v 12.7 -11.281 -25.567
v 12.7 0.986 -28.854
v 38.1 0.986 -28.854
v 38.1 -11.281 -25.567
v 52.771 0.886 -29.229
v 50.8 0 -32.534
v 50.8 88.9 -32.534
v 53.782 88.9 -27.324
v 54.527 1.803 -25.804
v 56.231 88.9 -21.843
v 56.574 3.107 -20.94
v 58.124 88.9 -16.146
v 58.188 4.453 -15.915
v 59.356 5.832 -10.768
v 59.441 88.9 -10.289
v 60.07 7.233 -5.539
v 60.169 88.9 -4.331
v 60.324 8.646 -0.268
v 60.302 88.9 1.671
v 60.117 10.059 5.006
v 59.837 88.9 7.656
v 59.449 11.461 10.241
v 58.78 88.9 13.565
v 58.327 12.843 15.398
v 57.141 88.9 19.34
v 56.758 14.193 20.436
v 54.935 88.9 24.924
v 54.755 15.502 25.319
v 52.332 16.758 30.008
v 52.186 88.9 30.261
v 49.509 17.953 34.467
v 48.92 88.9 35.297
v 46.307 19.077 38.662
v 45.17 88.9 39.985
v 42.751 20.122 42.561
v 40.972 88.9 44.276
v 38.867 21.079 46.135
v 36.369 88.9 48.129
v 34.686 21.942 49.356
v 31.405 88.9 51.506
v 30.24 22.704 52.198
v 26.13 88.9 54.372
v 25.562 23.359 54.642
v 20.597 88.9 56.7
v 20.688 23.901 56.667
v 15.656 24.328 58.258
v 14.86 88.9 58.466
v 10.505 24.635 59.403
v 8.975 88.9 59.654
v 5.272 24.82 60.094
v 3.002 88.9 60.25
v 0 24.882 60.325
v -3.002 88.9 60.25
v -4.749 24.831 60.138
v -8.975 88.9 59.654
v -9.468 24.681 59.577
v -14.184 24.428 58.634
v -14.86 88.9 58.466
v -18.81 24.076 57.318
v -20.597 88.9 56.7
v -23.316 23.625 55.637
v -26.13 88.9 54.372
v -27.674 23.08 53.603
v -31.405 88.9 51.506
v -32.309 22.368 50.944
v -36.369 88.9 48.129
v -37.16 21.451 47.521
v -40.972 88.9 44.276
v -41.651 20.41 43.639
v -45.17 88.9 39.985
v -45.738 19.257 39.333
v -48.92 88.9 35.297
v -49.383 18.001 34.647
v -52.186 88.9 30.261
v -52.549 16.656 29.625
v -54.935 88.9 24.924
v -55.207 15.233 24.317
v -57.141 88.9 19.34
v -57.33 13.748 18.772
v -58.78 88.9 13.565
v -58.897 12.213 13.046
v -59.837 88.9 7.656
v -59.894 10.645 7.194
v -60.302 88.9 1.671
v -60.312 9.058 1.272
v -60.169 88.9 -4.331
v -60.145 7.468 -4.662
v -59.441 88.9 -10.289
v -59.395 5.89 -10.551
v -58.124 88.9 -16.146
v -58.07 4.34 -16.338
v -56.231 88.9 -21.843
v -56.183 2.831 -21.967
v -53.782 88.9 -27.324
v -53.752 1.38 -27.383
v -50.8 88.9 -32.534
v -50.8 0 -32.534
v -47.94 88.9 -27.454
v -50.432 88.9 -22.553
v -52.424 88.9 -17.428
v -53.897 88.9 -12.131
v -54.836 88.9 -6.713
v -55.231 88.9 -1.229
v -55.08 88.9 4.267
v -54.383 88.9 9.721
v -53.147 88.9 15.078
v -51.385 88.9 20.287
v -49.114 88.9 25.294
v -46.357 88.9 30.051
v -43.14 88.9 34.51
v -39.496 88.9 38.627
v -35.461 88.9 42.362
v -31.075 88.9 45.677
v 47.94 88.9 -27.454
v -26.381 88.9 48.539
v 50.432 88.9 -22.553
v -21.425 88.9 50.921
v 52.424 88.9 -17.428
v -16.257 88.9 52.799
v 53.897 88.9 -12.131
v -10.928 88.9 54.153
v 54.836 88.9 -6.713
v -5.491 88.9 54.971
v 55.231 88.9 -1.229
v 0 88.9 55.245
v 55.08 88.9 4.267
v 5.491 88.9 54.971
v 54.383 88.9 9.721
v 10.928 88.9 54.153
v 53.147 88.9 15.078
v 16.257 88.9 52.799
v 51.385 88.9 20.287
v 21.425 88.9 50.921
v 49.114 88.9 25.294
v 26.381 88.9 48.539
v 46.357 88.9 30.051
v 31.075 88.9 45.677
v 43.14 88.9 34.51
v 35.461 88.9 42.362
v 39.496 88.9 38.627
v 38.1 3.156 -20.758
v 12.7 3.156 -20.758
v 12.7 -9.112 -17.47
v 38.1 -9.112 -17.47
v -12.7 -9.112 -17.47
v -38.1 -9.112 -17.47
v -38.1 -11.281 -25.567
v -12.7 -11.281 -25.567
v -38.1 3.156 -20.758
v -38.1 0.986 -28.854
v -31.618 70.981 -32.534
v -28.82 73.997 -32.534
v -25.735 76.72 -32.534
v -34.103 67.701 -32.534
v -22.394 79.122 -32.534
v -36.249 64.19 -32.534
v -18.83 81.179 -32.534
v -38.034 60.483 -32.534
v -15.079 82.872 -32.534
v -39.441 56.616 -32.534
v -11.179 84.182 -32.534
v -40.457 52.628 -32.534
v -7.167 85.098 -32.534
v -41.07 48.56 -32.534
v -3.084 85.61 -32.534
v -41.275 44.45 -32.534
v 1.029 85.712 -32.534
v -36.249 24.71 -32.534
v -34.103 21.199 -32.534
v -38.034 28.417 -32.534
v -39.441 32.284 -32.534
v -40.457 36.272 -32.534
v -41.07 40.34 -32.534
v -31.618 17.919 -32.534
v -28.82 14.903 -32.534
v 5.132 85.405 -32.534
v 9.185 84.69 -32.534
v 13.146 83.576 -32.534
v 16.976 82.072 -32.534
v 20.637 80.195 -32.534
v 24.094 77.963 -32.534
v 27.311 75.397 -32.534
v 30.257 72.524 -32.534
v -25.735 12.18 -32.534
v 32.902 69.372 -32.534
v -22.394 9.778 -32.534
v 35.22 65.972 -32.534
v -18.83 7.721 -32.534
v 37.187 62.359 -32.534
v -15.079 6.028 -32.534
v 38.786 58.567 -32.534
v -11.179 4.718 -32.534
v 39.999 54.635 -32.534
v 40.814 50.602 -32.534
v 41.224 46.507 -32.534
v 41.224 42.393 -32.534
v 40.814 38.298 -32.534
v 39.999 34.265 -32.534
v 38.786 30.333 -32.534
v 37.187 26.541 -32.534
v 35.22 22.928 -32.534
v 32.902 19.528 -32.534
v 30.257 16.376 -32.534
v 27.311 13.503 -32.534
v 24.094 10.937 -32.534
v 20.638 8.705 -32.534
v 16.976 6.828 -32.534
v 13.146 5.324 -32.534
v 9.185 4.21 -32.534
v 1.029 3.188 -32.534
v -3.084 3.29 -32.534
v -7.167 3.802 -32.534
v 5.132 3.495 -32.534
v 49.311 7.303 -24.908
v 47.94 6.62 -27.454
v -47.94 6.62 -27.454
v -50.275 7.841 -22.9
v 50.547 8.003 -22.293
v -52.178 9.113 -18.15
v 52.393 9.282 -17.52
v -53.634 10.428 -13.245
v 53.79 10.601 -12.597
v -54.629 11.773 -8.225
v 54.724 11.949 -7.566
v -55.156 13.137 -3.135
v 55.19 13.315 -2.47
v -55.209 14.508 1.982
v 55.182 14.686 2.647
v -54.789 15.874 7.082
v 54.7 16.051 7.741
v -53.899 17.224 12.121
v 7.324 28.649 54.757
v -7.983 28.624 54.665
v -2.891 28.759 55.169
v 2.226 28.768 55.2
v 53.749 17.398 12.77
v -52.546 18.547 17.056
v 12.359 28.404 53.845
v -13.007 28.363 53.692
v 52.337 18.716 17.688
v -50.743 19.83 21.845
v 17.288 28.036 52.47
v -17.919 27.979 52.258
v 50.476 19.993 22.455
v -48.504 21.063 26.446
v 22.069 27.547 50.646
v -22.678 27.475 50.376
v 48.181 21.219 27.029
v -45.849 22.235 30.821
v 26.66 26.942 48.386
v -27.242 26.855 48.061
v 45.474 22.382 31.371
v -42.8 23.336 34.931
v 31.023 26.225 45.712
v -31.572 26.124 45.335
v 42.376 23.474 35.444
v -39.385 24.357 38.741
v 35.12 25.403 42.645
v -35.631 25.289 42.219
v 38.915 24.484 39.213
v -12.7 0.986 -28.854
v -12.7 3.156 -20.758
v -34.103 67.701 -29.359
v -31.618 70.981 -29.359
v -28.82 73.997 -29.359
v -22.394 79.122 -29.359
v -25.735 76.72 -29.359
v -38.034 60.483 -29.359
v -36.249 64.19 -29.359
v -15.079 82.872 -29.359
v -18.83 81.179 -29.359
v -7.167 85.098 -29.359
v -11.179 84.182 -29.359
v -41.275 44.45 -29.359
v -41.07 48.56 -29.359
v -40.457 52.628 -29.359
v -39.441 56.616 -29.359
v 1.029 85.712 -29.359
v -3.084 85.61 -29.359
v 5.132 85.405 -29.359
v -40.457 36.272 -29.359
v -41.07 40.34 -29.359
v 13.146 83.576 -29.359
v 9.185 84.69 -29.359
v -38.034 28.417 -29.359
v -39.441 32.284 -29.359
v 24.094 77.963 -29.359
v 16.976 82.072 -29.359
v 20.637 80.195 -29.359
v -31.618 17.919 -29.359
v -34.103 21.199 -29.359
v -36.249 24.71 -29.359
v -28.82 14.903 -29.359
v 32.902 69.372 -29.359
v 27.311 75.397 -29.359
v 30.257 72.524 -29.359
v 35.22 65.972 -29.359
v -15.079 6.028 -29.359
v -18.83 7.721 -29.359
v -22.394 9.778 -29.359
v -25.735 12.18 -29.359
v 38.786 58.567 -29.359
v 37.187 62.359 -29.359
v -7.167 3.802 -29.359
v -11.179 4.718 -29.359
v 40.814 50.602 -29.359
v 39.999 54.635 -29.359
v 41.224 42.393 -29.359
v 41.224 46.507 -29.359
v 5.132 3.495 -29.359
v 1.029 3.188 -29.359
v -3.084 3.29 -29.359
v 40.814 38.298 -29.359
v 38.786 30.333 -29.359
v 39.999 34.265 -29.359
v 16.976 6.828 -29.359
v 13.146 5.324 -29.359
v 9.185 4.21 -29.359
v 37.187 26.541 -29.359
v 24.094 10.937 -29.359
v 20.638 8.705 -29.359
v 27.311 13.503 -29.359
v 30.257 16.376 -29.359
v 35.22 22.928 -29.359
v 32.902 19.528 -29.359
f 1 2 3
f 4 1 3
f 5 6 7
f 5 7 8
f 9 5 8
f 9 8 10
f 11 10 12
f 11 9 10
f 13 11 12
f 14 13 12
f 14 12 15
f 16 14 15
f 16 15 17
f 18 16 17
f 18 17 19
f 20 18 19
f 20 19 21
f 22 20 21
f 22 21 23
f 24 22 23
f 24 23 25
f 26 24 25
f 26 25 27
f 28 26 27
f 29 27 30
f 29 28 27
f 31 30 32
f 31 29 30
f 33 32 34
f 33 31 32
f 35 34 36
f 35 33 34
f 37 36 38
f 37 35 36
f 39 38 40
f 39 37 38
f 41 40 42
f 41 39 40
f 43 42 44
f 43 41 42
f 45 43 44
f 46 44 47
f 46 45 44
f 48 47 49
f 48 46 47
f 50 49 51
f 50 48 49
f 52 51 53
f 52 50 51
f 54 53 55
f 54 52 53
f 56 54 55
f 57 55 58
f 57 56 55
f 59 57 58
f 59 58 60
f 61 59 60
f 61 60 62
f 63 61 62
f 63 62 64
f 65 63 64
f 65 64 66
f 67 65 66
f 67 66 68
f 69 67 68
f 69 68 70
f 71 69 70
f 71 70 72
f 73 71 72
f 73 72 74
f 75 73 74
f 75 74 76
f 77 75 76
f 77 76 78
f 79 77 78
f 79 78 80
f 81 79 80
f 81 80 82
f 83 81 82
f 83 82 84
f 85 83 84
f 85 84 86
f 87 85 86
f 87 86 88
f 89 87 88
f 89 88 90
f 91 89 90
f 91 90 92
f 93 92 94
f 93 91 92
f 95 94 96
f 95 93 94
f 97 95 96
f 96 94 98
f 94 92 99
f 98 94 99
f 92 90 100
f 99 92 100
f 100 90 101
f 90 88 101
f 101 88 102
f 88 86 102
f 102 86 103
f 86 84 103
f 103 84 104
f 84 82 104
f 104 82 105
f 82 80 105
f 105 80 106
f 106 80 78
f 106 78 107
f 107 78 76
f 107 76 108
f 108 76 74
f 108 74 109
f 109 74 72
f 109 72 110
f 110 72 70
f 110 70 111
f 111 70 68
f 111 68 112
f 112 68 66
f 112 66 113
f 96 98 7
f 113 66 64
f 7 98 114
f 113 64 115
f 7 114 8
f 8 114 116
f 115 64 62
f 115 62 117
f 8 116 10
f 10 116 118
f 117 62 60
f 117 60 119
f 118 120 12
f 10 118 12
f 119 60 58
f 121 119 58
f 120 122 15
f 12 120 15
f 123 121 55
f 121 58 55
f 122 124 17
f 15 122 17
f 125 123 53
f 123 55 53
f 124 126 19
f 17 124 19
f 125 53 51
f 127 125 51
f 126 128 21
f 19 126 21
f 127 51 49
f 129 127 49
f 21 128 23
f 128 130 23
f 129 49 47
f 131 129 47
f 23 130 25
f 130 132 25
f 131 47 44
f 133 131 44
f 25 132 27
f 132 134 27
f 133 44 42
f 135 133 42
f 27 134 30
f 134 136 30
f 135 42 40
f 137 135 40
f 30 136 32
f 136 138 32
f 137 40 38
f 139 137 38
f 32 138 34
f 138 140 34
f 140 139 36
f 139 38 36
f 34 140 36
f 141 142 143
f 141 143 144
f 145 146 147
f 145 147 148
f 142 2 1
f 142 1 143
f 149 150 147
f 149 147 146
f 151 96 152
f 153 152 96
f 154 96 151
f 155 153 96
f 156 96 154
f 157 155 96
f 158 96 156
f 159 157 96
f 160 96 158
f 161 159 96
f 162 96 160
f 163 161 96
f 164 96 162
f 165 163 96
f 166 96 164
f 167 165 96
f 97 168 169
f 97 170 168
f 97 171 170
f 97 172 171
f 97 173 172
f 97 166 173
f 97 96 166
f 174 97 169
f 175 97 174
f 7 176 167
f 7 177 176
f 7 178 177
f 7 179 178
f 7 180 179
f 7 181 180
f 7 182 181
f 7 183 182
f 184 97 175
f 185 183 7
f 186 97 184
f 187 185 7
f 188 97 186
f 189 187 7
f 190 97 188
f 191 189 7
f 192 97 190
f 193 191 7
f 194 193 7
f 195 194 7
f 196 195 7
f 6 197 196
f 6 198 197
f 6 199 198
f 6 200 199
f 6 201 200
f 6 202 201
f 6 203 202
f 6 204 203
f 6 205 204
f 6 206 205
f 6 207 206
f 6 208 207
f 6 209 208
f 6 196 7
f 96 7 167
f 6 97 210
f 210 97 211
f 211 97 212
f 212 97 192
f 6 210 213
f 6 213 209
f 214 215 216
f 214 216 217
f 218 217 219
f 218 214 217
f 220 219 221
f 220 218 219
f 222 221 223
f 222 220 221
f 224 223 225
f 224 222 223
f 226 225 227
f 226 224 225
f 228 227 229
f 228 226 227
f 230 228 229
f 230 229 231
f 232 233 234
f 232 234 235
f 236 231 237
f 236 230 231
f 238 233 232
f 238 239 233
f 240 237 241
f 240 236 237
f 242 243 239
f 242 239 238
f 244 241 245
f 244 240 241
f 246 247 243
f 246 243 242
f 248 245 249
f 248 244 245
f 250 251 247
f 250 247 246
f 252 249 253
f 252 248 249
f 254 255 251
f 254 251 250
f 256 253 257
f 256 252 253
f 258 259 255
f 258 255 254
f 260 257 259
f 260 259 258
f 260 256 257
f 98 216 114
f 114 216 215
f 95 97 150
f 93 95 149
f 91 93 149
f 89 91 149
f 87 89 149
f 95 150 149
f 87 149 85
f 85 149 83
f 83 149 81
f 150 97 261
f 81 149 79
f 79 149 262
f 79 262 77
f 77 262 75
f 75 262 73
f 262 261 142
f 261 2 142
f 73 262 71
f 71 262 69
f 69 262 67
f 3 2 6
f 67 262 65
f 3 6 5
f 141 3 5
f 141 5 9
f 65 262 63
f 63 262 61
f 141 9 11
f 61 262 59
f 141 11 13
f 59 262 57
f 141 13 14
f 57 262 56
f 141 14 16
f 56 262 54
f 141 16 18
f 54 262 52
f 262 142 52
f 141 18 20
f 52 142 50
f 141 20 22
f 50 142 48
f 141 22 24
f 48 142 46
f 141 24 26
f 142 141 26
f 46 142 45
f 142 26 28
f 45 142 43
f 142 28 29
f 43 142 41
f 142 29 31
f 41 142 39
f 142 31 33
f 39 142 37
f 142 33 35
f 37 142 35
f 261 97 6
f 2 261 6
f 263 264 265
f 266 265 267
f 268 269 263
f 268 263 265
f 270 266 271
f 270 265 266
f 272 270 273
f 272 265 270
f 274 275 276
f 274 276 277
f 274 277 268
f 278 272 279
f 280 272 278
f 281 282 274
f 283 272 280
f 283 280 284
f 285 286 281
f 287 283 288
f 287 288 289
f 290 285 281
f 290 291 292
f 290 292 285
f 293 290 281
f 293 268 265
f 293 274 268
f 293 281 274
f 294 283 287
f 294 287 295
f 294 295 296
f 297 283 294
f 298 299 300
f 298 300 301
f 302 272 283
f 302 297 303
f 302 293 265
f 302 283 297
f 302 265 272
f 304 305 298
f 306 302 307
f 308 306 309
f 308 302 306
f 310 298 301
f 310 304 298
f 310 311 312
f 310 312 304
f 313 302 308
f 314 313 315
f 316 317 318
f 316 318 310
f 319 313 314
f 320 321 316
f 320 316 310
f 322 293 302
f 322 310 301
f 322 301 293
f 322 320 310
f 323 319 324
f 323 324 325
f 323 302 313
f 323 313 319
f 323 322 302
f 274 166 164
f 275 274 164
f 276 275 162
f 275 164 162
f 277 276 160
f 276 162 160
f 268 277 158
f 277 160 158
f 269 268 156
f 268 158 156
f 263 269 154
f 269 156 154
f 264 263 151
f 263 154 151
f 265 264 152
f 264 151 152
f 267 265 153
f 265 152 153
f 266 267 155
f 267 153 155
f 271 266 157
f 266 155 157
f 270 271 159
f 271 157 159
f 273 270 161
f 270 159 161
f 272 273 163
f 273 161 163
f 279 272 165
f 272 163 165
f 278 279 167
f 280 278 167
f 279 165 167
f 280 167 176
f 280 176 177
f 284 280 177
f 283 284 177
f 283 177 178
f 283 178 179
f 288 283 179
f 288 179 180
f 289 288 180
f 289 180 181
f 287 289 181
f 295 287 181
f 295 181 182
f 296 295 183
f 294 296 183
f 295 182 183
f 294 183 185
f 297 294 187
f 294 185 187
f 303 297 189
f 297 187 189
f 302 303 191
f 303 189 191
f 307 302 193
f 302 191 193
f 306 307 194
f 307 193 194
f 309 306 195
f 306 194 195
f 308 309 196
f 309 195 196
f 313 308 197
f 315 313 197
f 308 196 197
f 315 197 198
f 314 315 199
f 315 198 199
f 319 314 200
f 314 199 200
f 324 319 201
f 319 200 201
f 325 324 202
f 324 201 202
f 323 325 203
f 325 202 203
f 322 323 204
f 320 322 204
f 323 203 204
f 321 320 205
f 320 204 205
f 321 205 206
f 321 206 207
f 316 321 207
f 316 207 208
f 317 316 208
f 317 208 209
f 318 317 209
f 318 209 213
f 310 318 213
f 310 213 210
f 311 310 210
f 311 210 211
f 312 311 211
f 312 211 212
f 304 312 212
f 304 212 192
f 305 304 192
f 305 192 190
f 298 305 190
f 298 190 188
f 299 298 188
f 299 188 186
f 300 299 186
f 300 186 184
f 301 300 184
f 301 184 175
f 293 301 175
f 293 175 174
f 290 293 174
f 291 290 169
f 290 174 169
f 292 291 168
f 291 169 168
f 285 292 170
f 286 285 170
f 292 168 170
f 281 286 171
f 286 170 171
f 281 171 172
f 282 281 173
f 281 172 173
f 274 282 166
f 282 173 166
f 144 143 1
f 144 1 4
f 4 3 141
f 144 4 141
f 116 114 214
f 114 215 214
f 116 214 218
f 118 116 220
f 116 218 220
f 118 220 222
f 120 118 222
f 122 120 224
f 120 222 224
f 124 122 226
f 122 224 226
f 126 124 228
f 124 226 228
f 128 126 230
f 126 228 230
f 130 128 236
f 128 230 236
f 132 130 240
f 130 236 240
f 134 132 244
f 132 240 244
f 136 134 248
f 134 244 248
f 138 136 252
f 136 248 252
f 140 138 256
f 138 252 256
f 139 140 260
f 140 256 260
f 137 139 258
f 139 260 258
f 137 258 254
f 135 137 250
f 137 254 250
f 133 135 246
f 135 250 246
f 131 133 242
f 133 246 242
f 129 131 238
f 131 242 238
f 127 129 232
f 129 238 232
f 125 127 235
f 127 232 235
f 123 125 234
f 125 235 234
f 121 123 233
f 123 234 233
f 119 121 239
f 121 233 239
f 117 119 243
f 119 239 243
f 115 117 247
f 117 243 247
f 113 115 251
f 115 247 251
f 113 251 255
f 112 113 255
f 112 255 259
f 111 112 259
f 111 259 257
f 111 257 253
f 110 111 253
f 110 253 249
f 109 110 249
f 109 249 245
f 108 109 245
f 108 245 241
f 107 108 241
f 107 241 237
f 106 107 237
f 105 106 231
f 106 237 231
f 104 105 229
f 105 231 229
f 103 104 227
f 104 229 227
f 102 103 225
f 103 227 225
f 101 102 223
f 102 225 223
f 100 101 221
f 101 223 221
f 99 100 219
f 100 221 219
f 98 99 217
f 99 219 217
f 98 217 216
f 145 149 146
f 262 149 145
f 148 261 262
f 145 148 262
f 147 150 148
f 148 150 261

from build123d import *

# Parameters (mm, degrees)
F1_DEPTH = 88.9
F4_DEPTH = 212.726
F5_T     = -5.08
F6_W     = 25.4
F6_H     = 8.382
F7_DEPTH = 12.7
F9_DEPTH = 3.175


with BuildPart() as f1:
    # F0 (on Front) → F1 (new body)
    with BuildSketch(Plane.XZ):
        with BuildLine():
            Line((-50.8, -32.5340686819), (50.8, -32.5340686819))
            ThreePointArc((50.8, -32.5340686819), (0, 60.325), (-50.8, -32.5340686819))
        make_face()
    extrude(amount=-F1_DEPTH)

    # F3 (on offset) → F4 (cut, through all)
    with BuildSketch(Plane.YZ.offset(152.4)):
        Polygon((24.8815124632, 60.325), (0, 60.325), (0, -32.5340686819), align=None)
    extrude(amount=-F4_DEPTH, mode=Mode.SUBTRACT)

    # F5
    f5_openings = [f1.faces().sort_by_distance(p)[0] for p in [
        (0, 88.9, 9.256329),
    ]]
    offset(amount=F5_T, openings=f5_openings)

    # F6 (on face) → F7 (join)
    with BuildSketch(Plane(origin=(0, 8.1335171705, -2.1793693575), x_dir=(1, 0, 0), z_dir=(0, -0.9659258263, 0.2588190451))):
        with Locations((-25.4, -23.4244971741)):
            Rectangle(F6_W, F6_H)
        with Locations((25.4, -23.4244971741)):
            Rectangle(F6_W, F6_H)
    extrude(amount=F7_DEPTH)

    # F8 (on face) → F9 (cut)
    with BuildSketch(Plane(origin=(0, 0, -32.5340686819), x_dir=(1, 0, 0), z_dir=(0, 0, -1))):
        with BuildLine():
            ThreePointArc((41.275, -44.45), (0, -3.175), (-41.275, -44.45))
            Line((-41.275, -44.45), (41.275, -44.45))
        make_face()
        with BuildLine():
            Line((41.275, -44.45), (-41.275, -44.45))
            ThreePointArc((-41.275, -44.45), (0, -85.725), (41.275, -44.45))
        make_face()
    extrude(amount=-F9_DEPTH, mode=Mode.SUBTRACT)


solid = f1.part
